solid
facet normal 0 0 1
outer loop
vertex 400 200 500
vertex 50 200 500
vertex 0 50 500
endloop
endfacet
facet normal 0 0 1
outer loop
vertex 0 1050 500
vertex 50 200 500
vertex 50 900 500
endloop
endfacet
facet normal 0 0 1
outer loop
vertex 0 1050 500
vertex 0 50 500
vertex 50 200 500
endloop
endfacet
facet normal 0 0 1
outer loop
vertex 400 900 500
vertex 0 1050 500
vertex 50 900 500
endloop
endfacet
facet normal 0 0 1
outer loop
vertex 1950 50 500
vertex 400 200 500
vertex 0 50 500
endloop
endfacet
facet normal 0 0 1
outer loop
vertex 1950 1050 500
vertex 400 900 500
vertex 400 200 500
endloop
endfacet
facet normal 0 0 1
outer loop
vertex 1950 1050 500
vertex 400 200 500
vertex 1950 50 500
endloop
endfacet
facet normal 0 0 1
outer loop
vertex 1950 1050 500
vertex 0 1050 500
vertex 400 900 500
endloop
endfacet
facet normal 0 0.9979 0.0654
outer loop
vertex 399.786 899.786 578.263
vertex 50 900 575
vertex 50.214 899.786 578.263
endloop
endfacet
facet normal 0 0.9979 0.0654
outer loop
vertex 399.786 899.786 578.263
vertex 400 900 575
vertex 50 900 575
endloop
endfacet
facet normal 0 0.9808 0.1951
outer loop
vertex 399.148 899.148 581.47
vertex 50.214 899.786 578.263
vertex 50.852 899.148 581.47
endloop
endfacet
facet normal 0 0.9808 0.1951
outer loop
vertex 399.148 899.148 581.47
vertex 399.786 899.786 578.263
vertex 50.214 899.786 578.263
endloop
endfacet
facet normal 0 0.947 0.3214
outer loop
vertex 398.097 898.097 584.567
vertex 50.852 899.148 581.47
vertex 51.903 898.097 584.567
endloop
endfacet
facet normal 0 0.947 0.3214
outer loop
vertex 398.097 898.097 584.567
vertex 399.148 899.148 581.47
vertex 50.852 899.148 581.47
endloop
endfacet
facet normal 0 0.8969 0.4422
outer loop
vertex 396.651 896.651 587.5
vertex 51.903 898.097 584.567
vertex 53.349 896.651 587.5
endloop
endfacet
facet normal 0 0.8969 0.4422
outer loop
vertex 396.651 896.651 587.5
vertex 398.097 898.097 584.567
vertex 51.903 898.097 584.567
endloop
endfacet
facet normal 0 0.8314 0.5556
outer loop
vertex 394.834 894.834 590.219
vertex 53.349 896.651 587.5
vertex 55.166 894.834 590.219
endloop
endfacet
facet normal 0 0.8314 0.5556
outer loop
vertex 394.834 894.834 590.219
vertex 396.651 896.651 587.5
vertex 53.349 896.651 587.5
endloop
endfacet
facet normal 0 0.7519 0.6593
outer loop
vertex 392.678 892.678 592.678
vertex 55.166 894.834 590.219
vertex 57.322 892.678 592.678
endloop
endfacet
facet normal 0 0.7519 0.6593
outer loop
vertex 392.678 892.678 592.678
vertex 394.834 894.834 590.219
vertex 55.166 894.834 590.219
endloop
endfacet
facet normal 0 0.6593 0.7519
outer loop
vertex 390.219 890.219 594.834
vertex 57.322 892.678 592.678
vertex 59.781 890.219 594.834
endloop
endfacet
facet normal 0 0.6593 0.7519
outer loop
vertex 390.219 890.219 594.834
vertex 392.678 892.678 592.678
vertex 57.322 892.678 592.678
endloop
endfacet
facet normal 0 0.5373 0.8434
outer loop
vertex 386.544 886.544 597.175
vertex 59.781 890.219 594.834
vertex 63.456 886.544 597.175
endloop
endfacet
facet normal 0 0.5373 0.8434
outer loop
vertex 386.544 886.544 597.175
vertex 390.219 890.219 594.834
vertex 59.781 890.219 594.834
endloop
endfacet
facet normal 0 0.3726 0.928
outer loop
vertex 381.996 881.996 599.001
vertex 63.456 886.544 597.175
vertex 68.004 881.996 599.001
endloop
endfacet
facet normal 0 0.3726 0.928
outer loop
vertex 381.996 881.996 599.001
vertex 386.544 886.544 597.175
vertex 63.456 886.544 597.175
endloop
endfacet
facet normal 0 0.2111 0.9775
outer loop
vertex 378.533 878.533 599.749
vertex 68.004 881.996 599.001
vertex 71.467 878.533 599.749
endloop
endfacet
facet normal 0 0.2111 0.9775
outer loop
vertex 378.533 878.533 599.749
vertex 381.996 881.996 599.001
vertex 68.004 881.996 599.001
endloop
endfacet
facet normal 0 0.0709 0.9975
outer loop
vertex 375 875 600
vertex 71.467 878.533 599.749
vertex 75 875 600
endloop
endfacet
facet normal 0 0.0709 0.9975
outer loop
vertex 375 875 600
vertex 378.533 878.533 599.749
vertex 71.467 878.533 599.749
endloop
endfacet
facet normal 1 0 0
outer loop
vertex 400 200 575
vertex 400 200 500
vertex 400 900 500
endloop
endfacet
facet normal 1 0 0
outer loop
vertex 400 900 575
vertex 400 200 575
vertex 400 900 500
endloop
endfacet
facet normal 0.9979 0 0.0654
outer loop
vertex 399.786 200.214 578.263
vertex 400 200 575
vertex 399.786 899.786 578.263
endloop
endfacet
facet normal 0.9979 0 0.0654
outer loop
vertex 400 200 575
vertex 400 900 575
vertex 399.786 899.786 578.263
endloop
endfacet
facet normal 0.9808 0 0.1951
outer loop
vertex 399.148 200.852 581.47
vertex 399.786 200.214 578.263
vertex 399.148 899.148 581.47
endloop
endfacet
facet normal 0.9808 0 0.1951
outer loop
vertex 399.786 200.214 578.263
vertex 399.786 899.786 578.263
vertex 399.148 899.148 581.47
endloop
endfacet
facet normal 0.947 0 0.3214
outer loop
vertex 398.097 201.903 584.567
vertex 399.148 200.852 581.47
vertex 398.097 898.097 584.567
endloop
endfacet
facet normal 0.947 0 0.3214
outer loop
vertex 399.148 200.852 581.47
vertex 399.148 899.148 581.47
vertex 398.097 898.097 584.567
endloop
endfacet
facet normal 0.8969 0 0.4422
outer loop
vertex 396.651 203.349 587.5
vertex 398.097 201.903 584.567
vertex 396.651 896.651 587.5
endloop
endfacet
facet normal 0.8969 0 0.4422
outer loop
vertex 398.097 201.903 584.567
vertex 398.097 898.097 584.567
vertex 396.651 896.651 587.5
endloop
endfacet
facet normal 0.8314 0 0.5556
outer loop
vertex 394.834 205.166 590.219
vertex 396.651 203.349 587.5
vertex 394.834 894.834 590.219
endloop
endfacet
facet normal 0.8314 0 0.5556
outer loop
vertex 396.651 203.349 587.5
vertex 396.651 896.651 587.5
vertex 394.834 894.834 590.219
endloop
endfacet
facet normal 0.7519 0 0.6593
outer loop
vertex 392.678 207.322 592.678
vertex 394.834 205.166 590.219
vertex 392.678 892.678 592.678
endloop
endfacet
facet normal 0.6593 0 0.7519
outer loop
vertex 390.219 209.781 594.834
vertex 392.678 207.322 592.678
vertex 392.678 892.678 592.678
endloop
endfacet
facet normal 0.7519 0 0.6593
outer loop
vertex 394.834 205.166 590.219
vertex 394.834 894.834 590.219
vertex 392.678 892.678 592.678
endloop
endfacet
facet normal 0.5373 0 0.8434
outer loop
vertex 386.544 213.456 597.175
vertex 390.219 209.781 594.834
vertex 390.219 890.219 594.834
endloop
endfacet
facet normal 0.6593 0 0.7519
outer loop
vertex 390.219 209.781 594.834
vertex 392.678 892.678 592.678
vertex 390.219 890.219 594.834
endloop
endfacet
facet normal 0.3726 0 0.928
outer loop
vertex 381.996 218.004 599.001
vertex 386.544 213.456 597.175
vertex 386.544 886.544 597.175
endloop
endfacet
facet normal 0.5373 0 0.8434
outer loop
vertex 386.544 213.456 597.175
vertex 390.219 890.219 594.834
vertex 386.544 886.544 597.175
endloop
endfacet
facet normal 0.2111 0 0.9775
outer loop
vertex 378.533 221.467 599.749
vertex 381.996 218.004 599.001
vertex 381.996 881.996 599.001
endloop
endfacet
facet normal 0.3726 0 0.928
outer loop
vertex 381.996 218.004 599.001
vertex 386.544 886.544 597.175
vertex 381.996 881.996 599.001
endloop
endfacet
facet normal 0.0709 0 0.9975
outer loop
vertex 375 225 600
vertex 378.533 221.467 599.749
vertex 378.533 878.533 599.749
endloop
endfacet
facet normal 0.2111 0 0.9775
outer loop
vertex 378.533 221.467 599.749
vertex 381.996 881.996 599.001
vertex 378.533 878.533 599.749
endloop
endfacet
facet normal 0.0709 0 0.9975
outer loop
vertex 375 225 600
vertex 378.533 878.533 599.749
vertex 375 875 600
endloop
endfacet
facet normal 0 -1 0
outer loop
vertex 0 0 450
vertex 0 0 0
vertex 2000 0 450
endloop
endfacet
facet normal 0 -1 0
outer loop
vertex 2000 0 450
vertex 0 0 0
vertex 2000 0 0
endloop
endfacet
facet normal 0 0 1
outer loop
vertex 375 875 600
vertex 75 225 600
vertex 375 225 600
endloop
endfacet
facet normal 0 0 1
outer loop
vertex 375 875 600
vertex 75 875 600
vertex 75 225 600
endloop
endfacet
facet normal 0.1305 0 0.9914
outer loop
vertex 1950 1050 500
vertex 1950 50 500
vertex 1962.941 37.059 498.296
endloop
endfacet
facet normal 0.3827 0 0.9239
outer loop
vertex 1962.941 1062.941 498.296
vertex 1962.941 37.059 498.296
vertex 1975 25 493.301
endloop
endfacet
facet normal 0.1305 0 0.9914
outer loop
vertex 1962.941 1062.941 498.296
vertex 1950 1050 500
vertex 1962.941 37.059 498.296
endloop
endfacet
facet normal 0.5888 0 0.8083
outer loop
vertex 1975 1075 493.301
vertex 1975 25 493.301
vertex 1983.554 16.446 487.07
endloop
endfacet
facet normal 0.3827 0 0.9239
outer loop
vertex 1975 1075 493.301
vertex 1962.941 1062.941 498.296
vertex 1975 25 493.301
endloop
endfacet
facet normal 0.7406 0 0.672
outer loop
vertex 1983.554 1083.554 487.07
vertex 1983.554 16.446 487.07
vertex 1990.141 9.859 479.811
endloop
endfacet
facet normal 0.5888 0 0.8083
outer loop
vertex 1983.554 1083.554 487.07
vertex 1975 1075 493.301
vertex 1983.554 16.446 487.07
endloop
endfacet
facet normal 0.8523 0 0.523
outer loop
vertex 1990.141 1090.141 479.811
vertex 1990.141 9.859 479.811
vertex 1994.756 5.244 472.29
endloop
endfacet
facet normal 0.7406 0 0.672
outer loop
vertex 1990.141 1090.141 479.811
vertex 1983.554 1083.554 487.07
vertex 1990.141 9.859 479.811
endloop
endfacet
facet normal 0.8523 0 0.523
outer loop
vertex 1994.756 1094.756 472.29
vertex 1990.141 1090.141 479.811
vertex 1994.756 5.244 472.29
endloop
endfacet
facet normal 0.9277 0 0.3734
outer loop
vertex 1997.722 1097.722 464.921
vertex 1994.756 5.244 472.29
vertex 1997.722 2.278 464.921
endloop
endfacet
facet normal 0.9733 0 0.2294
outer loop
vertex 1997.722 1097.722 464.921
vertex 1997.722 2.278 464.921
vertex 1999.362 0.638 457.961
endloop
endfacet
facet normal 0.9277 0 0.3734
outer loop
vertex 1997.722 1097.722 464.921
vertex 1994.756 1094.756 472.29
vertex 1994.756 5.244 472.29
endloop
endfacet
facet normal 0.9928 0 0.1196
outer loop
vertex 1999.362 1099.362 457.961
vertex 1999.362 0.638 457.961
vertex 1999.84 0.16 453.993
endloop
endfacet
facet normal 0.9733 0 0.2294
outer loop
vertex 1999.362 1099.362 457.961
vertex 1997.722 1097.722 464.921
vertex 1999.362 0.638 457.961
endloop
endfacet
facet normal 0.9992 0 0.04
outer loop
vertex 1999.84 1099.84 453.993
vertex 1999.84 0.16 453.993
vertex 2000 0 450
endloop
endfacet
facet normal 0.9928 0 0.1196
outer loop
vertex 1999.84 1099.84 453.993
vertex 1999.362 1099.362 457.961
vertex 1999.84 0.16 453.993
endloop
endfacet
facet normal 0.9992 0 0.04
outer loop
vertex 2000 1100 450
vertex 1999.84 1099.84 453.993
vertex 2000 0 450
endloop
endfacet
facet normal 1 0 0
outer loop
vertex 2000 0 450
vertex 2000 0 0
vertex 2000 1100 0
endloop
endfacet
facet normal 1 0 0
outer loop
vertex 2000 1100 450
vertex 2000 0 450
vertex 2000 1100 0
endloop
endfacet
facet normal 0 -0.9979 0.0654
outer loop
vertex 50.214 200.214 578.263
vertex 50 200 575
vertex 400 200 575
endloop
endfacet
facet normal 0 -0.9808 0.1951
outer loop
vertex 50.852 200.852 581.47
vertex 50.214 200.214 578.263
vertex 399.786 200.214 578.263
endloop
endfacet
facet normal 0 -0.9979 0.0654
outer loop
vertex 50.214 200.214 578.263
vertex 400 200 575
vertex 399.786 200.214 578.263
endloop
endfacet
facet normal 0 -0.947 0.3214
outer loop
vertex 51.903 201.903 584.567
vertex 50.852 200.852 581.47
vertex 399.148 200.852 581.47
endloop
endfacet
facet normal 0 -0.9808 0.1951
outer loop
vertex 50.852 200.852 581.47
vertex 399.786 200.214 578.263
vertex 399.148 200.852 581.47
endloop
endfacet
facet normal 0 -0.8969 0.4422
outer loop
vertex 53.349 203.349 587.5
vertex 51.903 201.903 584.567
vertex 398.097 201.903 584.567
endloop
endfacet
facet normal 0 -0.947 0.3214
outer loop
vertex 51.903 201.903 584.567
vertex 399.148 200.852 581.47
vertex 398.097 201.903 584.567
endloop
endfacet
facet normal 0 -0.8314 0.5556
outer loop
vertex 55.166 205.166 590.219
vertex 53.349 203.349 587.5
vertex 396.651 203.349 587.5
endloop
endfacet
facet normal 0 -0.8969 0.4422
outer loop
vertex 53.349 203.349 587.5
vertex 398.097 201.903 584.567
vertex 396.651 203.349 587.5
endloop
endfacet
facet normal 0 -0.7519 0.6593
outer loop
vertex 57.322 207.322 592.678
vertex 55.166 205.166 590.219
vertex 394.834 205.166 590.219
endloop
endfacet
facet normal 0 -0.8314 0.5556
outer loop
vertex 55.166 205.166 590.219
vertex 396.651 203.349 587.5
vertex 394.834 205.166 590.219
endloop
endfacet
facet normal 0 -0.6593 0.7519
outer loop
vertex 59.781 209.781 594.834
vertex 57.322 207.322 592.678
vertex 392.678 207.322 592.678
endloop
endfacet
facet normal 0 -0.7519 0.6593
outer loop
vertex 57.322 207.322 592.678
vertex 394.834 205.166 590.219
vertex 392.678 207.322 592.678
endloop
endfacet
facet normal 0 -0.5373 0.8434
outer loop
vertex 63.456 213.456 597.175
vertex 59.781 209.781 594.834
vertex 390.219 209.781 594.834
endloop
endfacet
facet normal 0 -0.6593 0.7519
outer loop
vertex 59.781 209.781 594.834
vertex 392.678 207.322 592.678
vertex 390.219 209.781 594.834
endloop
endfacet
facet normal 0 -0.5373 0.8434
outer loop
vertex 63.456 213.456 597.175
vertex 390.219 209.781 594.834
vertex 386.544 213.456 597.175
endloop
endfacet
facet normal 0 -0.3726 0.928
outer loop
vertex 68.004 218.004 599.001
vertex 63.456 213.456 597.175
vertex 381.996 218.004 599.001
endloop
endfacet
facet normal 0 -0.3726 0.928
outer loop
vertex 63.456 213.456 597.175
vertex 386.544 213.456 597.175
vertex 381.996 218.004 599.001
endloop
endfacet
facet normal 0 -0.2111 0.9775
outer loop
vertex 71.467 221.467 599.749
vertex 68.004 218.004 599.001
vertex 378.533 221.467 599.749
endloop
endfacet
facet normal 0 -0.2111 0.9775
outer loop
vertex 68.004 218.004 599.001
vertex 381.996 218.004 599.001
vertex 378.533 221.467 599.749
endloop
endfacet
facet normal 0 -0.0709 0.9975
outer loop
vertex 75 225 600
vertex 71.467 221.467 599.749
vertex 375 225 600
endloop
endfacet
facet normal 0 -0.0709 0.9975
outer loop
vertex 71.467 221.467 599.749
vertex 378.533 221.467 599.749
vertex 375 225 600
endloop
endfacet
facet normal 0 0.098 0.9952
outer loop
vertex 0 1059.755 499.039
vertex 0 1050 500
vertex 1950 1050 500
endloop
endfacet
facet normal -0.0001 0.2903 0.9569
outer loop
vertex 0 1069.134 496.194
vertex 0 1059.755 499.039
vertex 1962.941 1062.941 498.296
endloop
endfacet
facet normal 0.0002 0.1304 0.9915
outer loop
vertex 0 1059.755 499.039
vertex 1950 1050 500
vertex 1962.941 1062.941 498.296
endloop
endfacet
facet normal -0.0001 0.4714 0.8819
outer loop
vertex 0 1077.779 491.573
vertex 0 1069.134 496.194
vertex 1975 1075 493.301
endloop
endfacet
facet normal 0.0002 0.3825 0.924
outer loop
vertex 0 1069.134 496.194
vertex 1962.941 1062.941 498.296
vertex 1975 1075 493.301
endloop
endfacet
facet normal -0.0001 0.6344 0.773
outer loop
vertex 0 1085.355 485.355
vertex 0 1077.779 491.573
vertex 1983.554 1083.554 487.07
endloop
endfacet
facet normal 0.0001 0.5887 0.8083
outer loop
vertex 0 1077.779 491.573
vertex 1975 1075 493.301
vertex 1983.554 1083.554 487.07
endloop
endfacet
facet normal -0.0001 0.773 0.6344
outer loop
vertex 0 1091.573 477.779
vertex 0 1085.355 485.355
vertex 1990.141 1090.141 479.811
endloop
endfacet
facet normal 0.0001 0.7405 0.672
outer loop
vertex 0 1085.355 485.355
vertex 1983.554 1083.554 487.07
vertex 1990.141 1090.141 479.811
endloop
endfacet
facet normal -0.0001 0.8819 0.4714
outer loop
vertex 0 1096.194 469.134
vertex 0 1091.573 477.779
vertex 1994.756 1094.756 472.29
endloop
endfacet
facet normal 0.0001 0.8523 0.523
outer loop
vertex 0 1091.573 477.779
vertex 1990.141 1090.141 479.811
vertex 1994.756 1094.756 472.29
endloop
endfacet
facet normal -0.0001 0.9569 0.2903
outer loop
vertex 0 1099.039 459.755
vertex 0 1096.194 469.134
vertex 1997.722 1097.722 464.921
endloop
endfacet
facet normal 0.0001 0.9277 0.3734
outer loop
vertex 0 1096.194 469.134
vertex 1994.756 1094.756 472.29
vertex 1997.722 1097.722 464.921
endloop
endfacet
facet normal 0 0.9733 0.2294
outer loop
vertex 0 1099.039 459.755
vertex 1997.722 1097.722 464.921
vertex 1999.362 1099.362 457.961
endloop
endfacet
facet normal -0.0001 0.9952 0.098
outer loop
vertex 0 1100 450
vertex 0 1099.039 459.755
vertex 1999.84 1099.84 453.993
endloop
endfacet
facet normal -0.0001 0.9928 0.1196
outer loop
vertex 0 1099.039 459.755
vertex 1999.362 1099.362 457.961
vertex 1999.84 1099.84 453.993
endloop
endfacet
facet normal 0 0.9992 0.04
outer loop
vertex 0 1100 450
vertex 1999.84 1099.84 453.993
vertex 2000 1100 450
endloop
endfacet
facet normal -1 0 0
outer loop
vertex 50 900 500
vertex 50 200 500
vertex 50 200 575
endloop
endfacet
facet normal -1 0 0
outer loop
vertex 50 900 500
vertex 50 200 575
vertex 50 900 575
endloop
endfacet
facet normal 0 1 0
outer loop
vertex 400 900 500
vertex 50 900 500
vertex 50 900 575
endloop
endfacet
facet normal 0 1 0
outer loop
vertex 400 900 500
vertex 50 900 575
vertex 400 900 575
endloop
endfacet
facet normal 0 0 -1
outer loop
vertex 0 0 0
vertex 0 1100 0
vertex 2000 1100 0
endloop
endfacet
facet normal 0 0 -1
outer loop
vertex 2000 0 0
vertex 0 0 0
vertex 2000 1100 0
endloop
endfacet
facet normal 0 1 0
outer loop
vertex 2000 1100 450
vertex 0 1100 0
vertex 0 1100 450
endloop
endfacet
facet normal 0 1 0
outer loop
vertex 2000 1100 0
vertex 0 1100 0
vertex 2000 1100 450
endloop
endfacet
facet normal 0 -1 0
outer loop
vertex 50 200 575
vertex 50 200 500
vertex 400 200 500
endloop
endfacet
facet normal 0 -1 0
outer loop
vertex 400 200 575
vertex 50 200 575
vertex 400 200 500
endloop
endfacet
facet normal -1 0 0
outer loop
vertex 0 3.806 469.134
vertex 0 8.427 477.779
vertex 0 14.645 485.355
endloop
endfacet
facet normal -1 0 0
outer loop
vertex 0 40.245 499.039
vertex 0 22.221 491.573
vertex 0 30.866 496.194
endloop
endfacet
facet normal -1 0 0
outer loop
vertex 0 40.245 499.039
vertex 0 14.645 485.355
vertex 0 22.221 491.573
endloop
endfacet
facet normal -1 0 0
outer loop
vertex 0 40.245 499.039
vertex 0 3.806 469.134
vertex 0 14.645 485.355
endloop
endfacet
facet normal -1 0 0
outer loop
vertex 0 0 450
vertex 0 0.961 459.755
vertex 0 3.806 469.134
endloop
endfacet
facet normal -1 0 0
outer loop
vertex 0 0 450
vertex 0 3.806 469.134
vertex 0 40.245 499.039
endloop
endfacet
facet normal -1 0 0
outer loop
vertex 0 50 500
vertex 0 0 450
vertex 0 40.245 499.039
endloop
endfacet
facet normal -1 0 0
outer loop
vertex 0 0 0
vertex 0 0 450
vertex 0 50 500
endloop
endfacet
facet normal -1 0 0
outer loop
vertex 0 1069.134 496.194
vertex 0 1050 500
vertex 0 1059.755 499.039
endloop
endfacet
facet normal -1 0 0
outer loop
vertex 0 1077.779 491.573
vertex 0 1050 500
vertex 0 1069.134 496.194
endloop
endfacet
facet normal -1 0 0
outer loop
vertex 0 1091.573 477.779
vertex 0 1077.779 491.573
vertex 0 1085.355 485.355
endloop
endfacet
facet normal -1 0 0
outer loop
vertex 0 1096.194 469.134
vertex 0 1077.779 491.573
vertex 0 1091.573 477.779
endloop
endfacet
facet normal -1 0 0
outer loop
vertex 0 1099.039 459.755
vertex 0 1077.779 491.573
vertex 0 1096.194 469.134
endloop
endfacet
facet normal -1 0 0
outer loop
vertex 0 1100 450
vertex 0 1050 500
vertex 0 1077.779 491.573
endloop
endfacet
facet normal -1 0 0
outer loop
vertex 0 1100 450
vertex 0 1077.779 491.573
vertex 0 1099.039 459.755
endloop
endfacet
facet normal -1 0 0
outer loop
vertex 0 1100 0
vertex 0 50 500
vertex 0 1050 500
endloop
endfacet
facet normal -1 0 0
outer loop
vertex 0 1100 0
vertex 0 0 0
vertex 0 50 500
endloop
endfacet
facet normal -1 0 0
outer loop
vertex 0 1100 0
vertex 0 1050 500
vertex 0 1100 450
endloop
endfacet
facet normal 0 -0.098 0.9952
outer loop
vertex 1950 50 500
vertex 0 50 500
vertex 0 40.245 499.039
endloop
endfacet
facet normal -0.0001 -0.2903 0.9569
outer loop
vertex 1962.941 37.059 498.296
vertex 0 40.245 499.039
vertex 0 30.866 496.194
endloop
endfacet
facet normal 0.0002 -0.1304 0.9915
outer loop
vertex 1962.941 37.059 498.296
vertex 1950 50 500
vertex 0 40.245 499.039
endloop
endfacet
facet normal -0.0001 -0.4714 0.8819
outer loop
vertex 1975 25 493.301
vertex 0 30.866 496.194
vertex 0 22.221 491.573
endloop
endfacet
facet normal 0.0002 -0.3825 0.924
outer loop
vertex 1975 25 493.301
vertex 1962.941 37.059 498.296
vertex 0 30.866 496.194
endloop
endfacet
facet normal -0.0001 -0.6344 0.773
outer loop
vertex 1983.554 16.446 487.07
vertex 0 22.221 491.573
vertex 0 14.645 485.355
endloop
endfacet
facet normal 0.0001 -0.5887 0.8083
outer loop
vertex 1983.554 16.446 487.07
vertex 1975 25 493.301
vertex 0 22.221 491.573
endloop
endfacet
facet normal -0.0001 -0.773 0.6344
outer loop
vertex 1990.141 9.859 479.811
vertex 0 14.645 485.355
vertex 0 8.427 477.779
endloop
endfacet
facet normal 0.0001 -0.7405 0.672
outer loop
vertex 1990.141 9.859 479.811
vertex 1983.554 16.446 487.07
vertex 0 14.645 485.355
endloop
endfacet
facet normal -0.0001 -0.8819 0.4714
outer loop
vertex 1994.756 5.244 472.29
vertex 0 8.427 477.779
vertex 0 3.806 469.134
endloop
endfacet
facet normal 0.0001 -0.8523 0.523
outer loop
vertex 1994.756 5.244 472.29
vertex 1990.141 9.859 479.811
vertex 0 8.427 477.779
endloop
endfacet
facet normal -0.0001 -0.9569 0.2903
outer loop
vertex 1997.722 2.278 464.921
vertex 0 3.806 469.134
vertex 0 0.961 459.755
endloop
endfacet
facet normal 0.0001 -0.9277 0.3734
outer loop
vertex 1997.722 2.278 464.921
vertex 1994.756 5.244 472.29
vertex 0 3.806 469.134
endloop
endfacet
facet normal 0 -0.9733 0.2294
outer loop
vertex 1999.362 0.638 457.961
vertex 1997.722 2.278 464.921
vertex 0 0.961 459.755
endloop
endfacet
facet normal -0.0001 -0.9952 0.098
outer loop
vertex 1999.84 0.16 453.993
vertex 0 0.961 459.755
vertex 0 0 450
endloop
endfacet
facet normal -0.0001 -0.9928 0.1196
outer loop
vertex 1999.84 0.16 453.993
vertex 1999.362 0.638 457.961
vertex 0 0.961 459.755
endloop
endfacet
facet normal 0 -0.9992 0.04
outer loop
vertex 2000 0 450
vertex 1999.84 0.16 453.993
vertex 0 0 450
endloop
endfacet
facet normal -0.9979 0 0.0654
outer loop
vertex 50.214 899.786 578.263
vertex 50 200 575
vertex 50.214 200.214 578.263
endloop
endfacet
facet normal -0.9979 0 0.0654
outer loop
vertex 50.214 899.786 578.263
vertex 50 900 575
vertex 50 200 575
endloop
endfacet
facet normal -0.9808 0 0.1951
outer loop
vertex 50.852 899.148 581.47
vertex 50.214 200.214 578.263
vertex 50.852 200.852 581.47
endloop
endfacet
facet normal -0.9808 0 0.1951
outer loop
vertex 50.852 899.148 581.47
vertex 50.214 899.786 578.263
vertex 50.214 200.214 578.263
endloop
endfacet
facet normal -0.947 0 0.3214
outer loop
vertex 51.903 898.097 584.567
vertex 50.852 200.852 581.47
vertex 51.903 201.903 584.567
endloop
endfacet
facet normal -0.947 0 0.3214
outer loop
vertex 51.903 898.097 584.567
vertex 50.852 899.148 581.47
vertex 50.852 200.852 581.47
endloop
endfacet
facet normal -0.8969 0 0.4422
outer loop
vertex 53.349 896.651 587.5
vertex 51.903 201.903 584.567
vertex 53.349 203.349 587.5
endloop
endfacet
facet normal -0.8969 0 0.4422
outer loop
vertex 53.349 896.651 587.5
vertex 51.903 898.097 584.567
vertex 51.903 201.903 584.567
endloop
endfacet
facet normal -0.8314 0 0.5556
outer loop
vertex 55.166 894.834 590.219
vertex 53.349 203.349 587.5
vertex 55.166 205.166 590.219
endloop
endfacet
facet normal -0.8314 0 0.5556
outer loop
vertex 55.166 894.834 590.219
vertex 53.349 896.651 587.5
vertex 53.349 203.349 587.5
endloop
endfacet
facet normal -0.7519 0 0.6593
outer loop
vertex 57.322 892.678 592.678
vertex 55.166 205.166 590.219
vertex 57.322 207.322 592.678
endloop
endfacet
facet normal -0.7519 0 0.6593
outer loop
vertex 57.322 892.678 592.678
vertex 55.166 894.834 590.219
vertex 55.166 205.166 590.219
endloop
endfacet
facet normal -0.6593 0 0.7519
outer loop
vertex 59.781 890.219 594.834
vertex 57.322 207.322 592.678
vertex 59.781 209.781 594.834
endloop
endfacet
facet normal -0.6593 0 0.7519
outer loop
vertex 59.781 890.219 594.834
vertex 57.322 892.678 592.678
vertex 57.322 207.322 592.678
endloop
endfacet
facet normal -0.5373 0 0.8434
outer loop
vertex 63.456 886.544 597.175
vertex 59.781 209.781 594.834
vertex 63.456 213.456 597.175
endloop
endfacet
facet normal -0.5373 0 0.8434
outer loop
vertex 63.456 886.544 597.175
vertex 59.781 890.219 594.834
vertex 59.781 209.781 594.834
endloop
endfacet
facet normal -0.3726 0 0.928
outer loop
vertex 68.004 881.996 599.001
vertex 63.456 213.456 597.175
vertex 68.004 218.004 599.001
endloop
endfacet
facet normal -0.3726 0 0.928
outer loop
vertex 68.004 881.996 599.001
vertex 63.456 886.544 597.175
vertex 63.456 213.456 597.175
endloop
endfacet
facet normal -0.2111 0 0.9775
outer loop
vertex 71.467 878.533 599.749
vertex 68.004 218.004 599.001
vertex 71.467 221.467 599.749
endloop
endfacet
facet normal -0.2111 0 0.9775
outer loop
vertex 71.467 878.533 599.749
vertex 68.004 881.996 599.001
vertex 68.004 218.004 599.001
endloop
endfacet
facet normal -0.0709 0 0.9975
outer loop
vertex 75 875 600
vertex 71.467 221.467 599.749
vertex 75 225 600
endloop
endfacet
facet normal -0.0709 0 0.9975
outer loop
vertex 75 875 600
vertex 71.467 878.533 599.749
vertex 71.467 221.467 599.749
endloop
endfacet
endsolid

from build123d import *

# Parameters (mm, degrees)
F0_W     = 2000
F0_H     = 1100
F1_DEPTH = 500
F2_W     = 350
F2_H     = 700
F3_DEPTH = 100
F4_R     = 25
F5_R     = 50


with BuildPart() as f1:
    # F0 (on Top) → F1 (new body)
    with BuildSketch(Plane.XY):
        with Locations((1000, 550)):
            Rectangle(F0_W, F0_H)
    extrude(amount=F1_DEPTH)

    # F2 (on face) → F3 (join)
    with BuildSketch(Plane.XY.offset(500)):
        with Locations((225, 550)):
            Rectangle(F2_W, F2_H)
    extrude(amount=F3_DEPTH)

    # F4
    f4_edges = [f1.edges().sort_by_distance(p)[0] for p in [
        (225, 200, 600),
        (50, 550, 600),
        (400, 550, 600),
        (225, 900, 600),
    ]]
    fillet(f4_edges, radius=F4_R)

    # F5
    f5_edges = [f1.edges().sort_by_distance(p)[0] for p in [
        (1000, 0, 500),
        (2000, 550, 500),
        (1000, 1100, 500),
    ]]
    fillet(f5_edges, radius=F5_R)


solid = f1.part
